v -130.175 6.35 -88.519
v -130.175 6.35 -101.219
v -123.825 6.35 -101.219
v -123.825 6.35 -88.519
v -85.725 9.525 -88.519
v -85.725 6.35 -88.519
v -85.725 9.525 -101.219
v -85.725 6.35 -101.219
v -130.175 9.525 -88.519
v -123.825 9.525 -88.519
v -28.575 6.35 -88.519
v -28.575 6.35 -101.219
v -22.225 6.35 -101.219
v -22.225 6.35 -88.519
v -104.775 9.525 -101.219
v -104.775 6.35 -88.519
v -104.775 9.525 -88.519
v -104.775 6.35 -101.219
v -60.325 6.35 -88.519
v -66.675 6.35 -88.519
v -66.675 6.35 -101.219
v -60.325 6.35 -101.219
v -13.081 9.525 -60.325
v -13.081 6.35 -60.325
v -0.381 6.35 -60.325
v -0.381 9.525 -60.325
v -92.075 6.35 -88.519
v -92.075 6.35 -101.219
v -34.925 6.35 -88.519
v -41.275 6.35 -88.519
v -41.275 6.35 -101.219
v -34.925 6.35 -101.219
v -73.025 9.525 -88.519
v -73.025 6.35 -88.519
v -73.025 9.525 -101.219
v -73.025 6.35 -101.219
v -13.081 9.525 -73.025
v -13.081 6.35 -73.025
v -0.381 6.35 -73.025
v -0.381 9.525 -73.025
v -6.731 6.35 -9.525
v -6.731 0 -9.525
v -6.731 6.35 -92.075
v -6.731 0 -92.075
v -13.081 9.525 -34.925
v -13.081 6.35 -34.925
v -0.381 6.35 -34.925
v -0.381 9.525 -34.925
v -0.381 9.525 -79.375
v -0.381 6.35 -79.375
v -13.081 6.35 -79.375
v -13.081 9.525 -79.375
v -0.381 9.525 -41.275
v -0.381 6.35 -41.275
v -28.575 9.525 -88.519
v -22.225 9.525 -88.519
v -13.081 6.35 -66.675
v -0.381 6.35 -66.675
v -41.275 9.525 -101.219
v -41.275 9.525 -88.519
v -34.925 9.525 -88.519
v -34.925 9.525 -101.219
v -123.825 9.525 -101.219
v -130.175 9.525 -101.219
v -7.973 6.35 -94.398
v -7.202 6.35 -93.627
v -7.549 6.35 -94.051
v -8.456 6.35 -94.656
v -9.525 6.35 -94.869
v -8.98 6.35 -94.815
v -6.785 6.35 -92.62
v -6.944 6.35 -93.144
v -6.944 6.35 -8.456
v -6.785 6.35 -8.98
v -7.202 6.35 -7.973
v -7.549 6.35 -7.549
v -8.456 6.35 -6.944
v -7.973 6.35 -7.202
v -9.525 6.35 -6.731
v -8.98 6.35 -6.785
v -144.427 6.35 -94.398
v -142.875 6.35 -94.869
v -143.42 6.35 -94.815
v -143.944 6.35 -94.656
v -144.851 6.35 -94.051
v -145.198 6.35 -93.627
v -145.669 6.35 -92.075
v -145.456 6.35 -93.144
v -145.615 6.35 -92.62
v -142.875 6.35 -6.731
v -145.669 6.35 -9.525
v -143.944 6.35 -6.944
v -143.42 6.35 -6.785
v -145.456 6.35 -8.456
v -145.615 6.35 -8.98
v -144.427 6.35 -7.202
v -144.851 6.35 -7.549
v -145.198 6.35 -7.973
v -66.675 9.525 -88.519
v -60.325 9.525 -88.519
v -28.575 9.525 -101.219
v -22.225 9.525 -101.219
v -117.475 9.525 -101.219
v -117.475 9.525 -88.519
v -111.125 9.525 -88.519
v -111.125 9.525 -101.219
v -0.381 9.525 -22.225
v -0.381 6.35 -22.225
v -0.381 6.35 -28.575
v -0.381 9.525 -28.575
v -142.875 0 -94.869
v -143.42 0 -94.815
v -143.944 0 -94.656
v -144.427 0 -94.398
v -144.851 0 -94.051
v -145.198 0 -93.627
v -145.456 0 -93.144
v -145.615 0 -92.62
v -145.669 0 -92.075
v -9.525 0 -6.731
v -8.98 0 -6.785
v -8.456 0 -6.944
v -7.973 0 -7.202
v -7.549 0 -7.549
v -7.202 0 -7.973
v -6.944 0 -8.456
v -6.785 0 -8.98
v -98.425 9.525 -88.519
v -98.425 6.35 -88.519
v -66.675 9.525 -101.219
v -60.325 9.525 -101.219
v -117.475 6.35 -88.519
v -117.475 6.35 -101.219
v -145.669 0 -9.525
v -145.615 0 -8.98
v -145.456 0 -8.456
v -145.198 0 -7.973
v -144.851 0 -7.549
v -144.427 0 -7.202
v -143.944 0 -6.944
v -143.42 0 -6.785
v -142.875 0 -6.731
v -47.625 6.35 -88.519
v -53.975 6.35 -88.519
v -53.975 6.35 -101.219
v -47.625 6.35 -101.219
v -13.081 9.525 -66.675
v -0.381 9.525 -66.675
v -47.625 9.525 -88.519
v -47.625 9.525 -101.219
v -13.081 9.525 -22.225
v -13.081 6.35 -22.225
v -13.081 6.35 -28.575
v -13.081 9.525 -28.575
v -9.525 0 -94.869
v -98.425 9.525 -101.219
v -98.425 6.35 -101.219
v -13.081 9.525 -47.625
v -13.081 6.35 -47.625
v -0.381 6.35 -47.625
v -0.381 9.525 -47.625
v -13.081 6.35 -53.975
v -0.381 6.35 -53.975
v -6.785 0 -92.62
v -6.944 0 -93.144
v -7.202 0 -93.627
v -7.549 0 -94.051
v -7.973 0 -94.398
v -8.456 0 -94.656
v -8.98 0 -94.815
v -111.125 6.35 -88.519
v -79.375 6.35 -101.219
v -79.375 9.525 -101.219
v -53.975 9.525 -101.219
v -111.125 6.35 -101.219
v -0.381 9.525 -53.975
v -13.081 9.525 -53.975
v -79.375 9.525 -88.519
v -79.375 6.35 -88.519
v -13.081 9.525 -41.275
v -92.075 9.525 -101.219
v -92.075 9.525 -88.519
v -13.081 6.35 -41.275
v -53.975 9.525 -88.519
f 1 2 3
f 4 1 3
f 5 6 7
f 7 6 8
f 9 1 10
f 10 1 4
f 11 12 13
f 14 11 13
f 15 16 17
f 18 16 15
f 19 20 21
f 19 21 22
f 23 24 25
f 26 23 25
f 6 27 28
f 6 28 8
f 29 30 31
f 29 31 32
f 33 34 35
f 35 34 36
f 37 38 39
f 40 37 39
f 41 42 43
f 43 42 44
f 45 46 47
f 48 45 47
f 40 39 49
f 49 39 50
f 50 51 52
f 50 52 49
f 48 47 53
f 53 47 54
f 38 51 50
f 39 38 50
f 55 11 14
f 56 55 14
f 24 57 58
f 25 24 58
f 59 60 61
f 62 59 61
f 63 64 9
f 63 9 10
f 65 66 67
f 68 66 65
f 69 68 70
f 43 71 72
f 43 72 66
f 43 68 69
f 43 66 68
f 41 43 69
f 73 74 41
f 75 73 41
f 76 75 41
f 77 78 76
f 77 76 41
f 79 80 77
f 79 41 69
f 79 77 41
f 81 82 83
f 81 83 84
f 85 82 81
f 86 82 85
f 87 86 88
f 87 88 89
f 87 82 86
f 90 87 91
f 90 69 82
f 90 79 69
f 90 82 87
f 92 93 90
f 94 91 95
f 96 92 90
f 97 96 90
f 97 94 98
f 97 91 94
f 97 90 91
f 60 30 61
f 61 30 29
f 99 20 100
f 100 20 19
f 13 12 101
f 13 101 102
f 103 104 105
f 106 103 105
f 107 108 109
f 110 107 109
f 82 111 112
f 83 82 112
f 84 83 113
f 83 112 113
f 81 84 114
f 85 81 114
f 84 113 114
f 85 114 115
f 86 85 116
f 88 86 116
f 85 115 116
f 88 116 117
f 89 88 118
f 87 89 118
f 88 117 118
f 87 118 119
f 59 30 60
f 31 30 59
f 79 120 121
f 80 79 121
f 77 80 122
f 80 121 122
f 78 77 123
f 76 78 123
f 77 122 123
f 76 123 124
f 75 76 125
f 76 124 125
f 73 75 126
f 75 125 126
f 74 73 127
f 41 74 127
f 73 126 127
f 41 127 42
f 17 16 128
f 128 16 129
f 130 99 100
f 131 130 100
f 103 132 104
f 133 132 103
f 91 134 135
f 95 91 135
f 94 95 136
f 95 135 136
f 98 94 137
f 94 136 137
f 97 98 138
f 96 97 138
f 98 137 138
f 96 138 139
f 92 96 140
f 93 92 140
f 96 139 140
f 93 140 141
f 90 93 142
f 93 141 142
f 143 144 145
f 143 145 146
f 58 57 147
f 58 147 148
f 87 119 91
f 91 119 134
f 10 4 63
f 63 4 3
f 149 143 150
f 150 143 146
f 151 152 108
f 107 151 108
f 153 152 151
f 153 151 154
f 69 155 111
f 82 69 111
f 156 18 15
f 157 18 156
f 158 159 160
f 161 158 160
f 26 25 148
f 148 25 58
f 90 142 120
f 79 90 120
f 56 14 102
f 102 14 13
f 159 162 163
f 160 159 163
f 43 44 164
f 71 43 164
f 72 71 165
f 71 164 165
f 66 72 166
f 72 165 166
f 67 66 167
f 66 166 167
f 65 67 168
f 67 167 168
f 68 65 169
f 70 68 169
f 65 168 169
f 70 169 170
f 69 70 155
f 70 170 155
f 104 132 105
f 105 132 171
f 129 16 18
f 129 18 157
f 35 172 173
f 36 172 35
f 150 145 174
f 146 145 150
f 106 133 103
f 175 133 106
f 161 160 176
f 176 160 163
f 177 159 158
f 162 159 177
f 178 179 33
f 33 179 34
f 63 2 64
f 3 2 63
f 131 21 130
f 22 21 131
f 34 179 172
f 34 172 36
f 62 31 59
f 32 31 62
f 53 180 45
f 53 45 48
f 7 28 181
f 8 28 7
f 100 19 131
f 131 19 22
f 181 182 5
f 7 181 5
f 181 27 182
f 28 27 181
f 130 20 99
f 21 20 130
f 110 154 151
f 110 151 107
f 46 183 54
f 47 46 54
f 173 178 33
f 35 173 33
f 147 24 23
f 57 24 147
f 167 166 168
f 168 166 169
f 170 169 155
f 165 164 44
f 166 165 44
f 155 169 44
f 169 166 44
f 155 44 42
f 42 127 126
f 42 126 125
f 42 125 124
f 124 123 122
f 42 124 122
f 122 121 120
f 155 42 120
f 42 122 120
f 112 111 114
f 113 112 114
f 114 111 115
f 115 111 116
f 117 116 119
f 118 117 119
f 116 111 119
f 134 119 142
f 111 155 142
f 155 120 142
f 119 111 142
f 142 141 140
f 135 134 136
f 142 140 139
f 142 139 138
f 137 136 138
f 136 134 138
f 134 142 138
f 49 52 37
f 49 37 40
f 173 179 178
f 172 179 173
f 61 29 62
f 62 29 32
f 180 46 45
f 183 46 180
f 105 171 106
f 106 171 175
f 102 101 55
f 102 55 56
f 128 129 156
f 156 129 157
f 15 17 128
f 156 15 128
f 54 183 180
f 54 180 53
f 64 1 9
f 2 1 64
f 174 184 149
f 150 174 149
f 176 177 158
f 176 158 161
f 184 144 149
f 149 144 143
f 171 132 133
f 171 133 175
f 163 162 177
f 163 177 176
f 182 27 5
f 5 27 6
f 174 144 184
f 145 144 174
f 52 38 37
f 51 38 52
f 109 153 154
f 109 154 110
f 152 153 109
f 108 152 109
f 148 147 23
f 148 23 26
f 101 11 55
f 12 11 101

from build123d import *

# Parameters (mm, degrees)
BOSS_EXTRUDE1_DEPTH    = 6.35
SKETCH2_W              = 6.35
SKETCH2_H              = 12.7
BOSS_EXTRUDE2_DEPTH    = 3.175
BOSS_EXTRUDE2_2_DEPTH  = 3.175
BOSS_EXTRUDE2_3_DEPTH  = 3.175
BOSS_EXTRUDE2_4_DEPTH  = 3.175
BOSS_EXTRUDE2_5_DEPTH  = 3.175
BOSS_EXTRUDE2_6_DEPTH  = 3.175
BOSS_EXTRUDE2_7_DEPTH  = 3.175
BOSS_EXTRUDE2_8_DEPTH  = 3.175
BOSS_EXTRUDE2_9_DEPTH  = 3.175
SKETCH2_W_2            = 12.7
SKETCH2_H_2            = 6.35
BOSS_EXTRUDE2_10_DEPTH = 3.175
BOSS_EXTRUDE2_11_DEPTH = 3.175
BOSS_EXTRUDE2_12_DEPTH = 3.175
BOSS_EXTRUDE2_13_DEPTH = 3.175
BOSS_EXTRUDE2_14_DEPTH = 3.175


with BuildPart() as part:
    # Sketch1 → Boss-Extrude1 (new body)
    with BuildSketch(Plane(origin=(0, 0, 0), x_dir=(-1, 0, 0), z_dir=(0, 1, 0))):
        with BuildLine():
            Line((145.669, -92.075), (145.669, -9.525))
            ThreePointArc((145.669, -9.525), (144.850656347, -7.549343653), (142.875, -6.731))
            Line((142.875, -6.731), (9.525, -6.731))
            ThreePointArc((9.525, -6.731), (7.549343653, -7.549343653), (6.731, -9.525))
            Line((6.731, -9.525), (6.731, -92.075))
            ThreePointArc((6.731, -92.075), (7.549343653, -94.050656347), (9.525, -94.869))
            Line((9.525, -94.869), (142.875, -94.869))
            ThreePointArc((142.875, -94.869), (144.850656347, -94.050656347), (145.669, -92.075))
        make_face()
    extrude(amount=BOSS_EXTRUDE1_DEPTH)


with BuildPart() as body_2:
    # Sketch2 → Boss-Extrude2 (new body)
    with BuildSketch(Plane(origin=(0, 6.35, 0), x_dir=(1, 0, 0), z_dir=(0, 1, 0))):
        with Locations((-63.5, 94.869)):
            Rectangle(SKETCH2_W, SKETCH2_H)
    extrude(amount=BOSS_EXTRUDE2_DEPTH)


with BuildPart() as body_3:
    # Sketch2 → Boss-Extrude2 2 (new body)
    with BuildSketch(Plane(origin=(0, 6.35, 0), x_dir=(1, 0, 0), z_dir=(0, 1, 0))):
        with Locations((-76.2, 94.869)):
            Rectangle(SKETCH2_W, SKETCH2_H)
    extrude(amount=BOSS_EXTRUDE2_2_DEPTH)


with BuildPart() as body_4:
    # Sketch2 → Boss-Extrude2 3 (new body)
    with BuildSketch(Plane(origin=(0, 6.35, 0), x_dir=(1, 0, 0), z_dir=(0, 1, 0))):
        with Locations((-50.8, 94.869)):
            Rectangle(SKETCH2_W, SKETCH2_H)
    extrude(amount=BOSS_EXTRUDE2_3_DEPTH)


with BuildPart() as body_5:
    # Sketch2 → Boss-Extrude2 4 (new body)
    with BuildSketch(Plane(origin=(0, 6.35, 0), x_dir=(1, 0, 0), z_dir=(0, 1, 0))):
        with Locations((-38.1, 94.869)):
            Rectangle(SKETCH2_W, SKETCH2_H)
    extrude(amount=BOSS_EXTRUDE2_4_DEPTH)


with BuildPart() as body_6:
    # Sketch2 → Boss-Extrude2 5 (new body)
    with BuildSketch(Plane(origin=(0, 6.35, 0), x_dir=(1, 0, 0), z_dir=(0, 1, 0))):
        with Locations((-25.4, 94.869)):
            Rectangle(SKETCH2_W, SKETCH2_H)
    extrude(amount=BOSS_EXTRUDE2_5_DEPTH)


with BuildPart() as body_7:
    # Sketch2 → Boss-Extrude2 6 (new body)
    with BuildSketch(Plane(origin=(0, 6.35, 0), x_dir=(1, 0, 0), z_dir=(0, 1, 0))):
        with Locations((-88.9, 94.869)):
            Rectangle(SKETCH2_W, SKETCH2_H)
    extrude(amount=BOSS_EXTRUDE2_6_DEPTH)


with BuildPart() as body_8:
    # Sketch2 → Boss-Extrude2 7 (new body)
    with BuildSketch(Plane(origin=(0, 6.35, 0), x_dir=(1, 0, 0), z_dir=(0, 1, 0))):
        with Locations((-101.6, 94.869)):
            Rectangle(SKETCH2_W, SKETCH2_H)
    extrude(amount=BOSS_EXTRUDE2_7_DEPTH)


with BuildPart() as body_9:
    # Sketch2 → Boss-Extrude2 8 (new body)
    with BuildSketch(Plane(origin=(0, 6.35, 0), x_dir=(1, 0, 0), z_dir=(0, 1, 0))):
        with Locations((-114.3, 94.869)):
            Rectangle(SKETCH2_W, SKETCH2_H)
    extrude(amount=BOSS_EXTRUDE2_8_DEPTH)


with BuildPart() as body_10:
    # Sketch2 → Boss-Extrude2 9 (new body)
    with BuildSketch(Plane(origin=(0, 6.35, 0), x_dir=(1, 0, 0), z_dir=(0, 1, 0))):
        with Locations((-127, 94.869)):
            Rectangle(SKETCH2_W, SKETCH2_H)
    extrude(amount=BOSS_EXTRUDE2_9_DEPTH)


with BuildPart() as body_11:
    # Sketch2 → Boss-Extrude2 10 (new body)
    with BuildSketch(Plane(origin=(0, 6.35, 0), x_dir=(1, 0, 0), z_dir=(0, 1, 0))):
        with Locations((-6.731, 50.8)):
            Rectangle(SKETCH2_W_2, SKETCH2_H_2)
    extrude(amount=BOSS_EXTRUDE2_10_DEPTH)


with BuildPart() as body_12:
    # Sketch2 → Boss-Extrude2 11 (new body)
    with BuildSketch(Plane(origin=(0, 6.35, 0), x_dir=(1, 0, 0), z_dir=(0, 1, 0))):
        with Locations((-6.731, 63.5)):
            Rectangle(SKETCH2_W_2, SKETCH2_H_2)
    extrude(amount=BOSS_EXTRUDE2_11_DEPTH)


with BuildPart() as body_13:
    # Sketch2 → Boss-Extrude2 12 (new body)
    with BuildSketch(Plane(origin=(0, 6.35, 0), x_dir=(1, 0, 0), z_dir=(0, 1, 0))):
        with Locations((-6.731, 76.2)):
            Rectangle(SKETCH2_W_2, SKETCH2_H_2)
    extrude(amount=BOSS_EXTRUDE2_12_DEPTH)


with BuildPart() as body_14:
    # Sketch2 → Boss-Extrude2 13 (new body)
    with BuildSketch(Plane(origin=(0, 6.35, 0), x_dir=(1, 0, 0), z_dir=(0, 1, 0))):
        with Locations((-6.731, 38.1)):
            Rectangle(SKETCH2_W_2, SKETCH2_H_2)
    extrude(amount=BOSS_EXTRUDE2_13_DEPTH)


with BuildPart() as body_15:
    # Sketch2 → Boss-Extrude2 14 (new body)
    with BuildSketch(Plane(origin=(0, 6.35, 0), x_dir=(1, 0, 0), z_dir=(0, 1, 0))):
        with Locations((-6.731, 25.4)):
            Rectangle(SKETCH2_W_2, SKETCH2_H_2)
    extrude(amount=BOSS_EXTRUDE2_14_DEPTH)


solid = Compound([part.part, body_2.part, body_3.part, body_4.part, body_5.part, body_6.part, body_7.part, body_8.part, body_9.part, body_10.part, body_11.part, body_12.part, body_13.part, body_14.part, body_15.part])
